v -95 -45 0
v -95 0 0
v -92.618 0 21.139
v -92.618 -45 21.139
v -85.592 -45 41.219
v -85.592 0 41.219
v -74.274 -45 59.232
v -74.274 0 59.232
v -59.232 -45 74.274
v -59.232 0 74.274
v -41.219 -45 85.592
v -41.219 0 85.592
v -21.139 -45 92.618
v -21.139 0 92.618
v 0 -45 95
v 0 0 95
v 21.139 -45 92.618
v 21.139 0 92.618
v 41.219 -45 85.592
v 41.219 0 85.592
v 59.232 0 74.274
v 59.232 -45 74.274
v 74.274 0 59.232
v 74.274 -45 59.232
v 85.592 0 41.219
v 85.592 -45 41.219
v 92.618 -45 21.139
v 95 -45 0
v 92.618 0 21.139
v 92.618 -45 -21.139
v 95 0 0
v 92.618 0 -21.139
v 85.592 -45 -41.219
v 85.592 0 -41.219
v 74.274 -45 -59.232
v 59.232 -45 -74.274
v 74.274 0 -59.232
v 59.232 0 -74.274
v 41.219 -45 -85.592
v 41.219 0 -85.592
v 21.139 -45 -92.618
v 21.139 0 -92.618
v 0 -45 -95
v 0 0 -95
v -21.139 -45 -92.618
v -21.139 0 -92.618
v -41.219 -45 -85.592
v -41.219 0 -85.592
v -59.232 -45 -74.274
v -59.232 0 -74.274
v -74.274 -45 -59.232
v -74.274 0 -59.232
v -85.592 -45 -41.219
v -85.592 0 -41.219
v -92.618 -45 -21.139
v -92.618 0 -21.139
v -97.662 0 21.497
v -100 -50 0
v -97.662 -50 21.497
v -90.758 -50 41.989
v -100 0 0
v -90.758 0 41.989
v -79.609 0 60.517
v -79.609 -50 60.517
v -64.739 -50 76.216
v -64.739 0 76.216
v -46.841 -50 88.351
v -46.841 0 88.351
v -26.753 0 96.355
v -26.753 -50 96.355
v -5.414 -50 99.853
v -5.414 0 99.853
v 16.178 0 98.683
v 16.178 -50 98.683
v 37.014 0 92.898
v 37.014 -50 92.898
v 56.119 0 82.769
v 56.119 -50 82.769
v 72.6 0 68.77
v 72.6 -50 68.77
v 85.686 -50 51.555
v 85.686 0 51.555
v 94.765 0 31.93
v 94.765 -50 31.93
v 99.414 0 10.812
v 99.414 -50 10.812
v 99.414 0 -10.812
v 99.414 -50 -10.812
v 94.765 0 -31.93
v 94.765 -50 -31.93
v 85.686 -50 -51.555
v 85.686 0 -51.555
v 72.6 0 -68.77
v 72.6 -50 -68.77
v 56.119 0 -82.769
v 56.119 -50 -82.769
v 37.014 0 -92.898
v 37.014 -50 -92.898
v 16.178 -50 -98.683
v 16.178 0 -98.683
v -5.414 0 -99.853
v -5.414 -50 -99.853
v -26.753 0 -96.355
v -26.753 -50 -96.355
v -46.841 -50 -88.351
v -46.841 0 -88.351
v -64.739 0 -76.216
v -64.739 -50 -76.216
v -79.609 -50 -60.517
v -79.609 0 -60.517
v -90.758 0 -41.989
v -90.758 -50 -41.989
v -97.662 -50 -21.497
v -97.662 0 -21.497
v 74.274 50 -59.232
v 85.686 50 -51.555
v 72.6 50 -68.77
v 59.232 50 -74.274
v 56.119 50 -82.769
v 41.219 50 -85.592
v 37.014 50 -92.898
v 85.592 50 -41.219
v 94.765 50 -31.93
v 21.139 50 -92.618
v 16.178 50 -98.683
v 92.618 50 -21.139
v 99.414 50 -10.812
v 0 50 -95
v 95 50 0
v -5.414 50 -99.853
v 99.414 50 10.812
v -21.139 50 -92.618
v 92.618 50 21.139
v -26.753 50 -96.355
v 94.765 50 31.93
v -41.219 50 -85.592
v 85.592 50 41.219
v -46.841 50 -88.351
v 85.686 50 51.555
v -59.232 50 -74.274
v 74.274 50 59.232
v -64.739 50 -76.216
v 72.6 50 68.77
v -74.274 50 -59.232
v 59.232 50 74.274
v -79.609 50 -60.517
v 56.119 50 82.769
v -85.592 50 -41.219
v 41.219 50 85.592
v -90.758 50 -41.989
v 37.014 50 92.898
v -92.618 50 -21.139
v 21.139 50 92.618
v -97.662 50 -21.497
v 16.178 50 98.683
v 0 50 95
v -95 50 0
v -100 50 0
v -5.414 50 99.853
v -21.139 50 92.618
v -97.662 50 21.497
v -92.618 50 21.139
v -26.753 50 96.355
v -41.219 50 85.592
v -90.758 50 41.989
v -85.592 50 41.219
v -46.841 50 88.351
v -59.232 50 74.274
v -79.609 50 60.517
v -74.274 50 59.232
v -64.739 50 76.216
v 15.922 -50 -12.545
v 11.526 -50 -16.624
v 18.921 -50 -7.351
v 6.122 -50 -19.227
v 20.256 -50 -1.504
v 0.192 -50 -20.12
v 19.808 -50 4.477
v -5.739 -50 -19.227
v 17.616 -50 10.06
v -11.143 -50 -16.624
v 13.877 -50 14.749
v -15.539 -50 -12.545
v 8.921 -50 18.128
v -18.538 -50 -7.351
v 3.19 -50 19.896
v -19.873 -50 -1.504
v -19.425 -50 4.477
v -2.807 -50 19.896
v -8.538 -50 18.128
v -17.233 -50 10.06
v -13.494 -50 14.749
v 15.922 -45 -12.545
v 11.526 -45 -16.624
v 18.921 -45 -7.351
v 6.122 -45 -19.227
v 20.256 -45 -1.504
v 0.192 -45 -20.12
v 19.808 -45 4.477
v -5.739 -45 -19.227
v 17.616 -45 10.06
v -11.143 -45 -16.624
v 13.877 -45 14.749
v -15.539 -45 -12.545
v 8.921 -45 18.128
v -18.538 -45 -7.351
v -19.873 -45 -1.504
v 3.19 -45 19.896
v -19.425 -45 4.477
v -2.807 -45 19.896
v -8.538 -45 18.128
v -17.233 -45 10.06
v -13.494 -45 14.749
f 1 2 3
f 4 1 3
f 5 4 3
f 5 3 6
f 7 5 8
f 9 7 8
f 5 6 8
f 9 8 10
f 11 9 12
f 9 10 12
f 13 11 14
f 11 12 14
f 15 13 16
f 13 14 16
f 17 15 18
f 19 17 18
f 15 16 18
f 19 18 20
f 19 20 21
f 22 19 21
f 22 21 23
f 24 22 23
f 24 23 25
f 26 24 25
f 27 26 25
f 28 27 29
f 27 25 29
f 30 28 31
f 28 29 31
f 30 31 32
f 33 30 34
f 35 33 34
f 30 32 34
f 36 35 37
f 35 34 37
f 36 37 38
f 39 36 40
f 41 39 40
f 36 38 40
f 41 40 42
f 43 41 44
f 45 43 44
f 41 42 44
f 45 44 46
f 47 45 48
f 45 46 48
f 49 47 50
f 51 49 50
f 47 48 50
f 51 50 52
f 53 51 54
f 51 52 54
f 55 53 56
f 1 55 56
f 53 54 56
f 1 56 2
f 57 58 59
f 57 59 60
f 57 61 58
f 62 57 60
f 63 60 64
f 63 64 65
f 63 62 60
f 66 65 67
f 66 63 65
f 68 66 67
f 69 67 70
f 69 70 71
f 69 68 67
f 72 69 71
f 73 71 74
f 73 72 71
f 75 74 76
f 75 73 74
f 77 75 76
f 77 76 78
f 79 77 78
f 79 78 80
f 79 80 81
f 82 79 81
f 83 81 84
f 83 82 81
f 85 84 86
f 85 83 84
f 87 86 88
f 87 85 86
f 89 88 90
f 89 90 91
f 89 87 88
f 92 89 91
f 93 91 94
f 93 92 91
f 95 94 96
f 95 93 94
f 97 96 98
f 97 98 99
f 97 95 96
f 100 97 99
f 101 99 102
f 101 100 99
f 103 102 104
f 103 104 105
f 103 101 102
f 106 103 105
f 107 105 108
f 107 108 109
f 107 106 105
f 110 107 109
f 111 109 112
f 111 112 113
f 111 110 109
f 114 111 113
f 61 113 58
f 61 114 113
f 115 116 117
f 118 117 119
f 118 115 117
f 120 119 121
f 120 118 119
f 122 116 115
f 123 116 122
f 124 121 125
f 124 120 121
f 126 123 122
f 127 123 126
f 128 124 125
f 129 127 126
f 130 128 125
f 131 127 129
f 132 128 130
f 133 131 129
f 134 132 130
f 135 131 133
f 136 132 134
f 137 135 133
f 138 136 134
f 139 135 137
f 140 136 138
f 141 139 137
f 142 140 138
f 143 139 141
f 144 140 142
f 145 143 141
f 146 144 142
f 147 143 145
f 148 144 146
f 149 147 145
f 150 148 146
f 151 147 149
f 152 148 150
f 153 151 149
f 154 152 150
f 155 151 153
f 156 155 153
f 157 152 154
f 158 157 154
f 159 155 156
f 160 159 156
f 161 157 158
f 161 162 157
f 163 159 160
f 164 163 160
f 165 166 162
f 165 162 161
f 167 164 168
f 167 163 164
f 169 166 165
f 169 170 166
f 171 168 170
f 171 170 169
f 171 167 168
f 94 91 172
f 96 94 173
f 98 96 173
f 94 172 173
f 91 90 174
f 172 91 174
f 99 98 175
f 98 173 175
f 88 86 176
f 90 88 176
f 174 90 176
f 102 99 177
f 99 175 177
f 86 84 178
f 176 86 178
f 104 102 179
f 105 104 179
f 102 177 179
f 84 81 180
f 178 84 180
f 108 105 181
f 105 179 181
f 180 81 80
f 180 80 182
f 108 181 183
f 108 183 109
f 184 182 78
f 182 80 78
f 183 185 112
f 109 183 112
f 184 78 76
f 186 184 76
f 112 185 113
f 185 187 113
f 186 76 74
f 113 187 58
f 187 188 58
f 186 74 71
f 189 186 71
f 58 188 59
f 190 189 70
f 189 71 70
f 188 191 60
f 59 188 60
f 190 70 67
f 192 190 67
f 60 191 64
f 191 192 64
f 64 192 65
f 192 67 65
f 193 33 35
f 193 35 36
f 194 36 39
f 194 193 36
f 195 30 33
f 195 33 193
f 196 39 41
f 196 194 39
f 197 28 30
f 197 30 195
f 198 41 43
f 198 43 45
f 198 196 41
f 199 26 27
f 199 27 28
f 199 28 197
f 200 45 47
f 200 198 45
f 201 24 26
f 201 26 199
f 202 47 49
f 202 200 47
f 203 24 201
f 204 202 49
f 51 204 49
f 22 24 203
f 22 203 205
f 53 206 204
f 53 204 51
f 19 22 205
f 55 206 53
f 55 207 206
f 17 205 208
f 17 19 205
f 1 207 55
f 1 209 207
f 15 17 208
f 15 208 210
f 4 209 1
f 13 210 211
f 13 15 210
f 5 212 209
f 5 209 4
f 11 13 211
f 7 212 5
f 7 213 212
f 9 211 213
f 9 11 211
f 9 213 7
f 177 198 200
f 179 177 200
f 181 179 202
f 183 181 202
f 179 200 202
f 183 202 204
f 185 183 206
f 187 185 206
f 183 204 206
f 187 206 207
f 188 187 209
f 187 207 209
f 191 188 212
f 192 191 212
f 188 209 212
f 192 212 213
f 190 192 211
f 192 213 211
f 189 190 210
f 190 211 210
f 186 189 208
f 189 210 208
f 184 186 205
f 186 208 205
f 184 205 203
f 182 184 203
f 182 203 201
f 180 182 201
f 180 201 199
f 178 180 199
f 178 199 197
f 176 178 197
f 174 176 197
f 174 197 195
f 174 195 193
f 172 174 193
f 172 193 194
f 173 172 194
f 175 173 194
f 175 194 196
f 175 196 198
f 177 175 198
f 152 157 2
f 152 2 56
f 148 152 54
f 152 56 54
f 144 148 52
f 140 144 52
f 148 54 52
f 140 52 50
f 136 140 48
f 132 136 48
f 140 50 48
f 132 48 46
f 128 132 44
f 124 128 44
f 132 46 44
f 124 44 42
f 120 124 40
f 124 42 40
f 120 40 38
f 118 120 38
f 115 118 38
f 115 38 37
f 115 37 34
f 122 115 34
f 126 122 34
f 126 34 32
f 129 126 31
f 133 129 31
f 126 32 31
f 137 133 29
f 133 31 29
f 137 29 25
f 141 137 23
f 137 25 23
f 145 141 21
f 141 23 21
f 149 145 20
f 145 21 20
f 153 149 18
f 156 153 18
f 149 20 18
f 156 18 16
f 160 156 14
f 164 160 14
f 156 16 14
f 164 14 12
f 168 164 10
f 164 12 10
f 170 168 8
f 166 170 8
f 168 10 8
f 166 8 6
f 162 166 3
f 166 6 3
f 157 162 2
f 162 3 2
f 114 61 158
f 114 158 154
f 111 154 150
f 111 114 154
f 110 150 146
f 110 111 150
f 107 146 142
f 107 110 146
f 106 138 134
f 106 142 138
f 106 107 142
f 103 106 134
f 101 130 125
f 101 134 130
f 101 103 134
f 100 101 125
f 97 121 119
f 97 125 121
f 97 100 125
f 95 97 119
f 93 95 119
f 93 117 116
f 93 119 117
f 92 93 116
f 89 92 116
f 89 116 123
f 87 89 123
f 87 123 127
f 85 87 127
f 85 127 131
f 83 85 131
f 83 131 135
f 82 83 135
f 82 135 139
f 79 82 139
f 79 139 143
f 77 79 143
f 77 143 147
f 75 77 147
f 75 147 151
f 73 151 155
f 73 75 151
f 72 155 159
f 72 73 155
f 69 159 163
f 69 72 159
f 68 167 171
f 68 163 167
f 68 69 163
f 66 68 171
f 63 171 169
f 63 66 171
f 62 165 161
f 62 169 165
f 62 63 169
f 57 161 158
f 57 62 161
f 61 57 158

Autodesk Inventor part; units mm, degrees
ref_plane "YZ Plane" through (0, 0, 0) normal (1, 0, 0) x (0, 1, 0)
ref_plane "XZ Plane" through (0, 0, 0) normal (0, 1, 0) x (-1, 0, 0)
ref_plane "XY Plane" through (0, 0, 0) normal (0, 0, 1) x (1, 0, 0)
sketch "Boceto1" plane through (0, 0, 0) normal (0, 1, 0) x (-1, 0, 0)
  circle A0 centre (0, 0) radius 100
  dimension "d0" = 200
extrude "Extrusión1" add sketch "Boceto1" along normal mid plane 100
shell "Vaciado1" thickness 5 removed faces 1 at (-44.3571, 50, 16.5389)
sketch "Boceto2" plane through (0, -50, 0) normal (0, -1, 0) x (1, 0, 0)
  point P0 (0, 0)
  point P1 (0.1915, 0)
hole "Agujero1" at (0.1915, -50, 0) direction (0, 1, 0) diameter 40.241 end through all
properties part number "base redonda"
